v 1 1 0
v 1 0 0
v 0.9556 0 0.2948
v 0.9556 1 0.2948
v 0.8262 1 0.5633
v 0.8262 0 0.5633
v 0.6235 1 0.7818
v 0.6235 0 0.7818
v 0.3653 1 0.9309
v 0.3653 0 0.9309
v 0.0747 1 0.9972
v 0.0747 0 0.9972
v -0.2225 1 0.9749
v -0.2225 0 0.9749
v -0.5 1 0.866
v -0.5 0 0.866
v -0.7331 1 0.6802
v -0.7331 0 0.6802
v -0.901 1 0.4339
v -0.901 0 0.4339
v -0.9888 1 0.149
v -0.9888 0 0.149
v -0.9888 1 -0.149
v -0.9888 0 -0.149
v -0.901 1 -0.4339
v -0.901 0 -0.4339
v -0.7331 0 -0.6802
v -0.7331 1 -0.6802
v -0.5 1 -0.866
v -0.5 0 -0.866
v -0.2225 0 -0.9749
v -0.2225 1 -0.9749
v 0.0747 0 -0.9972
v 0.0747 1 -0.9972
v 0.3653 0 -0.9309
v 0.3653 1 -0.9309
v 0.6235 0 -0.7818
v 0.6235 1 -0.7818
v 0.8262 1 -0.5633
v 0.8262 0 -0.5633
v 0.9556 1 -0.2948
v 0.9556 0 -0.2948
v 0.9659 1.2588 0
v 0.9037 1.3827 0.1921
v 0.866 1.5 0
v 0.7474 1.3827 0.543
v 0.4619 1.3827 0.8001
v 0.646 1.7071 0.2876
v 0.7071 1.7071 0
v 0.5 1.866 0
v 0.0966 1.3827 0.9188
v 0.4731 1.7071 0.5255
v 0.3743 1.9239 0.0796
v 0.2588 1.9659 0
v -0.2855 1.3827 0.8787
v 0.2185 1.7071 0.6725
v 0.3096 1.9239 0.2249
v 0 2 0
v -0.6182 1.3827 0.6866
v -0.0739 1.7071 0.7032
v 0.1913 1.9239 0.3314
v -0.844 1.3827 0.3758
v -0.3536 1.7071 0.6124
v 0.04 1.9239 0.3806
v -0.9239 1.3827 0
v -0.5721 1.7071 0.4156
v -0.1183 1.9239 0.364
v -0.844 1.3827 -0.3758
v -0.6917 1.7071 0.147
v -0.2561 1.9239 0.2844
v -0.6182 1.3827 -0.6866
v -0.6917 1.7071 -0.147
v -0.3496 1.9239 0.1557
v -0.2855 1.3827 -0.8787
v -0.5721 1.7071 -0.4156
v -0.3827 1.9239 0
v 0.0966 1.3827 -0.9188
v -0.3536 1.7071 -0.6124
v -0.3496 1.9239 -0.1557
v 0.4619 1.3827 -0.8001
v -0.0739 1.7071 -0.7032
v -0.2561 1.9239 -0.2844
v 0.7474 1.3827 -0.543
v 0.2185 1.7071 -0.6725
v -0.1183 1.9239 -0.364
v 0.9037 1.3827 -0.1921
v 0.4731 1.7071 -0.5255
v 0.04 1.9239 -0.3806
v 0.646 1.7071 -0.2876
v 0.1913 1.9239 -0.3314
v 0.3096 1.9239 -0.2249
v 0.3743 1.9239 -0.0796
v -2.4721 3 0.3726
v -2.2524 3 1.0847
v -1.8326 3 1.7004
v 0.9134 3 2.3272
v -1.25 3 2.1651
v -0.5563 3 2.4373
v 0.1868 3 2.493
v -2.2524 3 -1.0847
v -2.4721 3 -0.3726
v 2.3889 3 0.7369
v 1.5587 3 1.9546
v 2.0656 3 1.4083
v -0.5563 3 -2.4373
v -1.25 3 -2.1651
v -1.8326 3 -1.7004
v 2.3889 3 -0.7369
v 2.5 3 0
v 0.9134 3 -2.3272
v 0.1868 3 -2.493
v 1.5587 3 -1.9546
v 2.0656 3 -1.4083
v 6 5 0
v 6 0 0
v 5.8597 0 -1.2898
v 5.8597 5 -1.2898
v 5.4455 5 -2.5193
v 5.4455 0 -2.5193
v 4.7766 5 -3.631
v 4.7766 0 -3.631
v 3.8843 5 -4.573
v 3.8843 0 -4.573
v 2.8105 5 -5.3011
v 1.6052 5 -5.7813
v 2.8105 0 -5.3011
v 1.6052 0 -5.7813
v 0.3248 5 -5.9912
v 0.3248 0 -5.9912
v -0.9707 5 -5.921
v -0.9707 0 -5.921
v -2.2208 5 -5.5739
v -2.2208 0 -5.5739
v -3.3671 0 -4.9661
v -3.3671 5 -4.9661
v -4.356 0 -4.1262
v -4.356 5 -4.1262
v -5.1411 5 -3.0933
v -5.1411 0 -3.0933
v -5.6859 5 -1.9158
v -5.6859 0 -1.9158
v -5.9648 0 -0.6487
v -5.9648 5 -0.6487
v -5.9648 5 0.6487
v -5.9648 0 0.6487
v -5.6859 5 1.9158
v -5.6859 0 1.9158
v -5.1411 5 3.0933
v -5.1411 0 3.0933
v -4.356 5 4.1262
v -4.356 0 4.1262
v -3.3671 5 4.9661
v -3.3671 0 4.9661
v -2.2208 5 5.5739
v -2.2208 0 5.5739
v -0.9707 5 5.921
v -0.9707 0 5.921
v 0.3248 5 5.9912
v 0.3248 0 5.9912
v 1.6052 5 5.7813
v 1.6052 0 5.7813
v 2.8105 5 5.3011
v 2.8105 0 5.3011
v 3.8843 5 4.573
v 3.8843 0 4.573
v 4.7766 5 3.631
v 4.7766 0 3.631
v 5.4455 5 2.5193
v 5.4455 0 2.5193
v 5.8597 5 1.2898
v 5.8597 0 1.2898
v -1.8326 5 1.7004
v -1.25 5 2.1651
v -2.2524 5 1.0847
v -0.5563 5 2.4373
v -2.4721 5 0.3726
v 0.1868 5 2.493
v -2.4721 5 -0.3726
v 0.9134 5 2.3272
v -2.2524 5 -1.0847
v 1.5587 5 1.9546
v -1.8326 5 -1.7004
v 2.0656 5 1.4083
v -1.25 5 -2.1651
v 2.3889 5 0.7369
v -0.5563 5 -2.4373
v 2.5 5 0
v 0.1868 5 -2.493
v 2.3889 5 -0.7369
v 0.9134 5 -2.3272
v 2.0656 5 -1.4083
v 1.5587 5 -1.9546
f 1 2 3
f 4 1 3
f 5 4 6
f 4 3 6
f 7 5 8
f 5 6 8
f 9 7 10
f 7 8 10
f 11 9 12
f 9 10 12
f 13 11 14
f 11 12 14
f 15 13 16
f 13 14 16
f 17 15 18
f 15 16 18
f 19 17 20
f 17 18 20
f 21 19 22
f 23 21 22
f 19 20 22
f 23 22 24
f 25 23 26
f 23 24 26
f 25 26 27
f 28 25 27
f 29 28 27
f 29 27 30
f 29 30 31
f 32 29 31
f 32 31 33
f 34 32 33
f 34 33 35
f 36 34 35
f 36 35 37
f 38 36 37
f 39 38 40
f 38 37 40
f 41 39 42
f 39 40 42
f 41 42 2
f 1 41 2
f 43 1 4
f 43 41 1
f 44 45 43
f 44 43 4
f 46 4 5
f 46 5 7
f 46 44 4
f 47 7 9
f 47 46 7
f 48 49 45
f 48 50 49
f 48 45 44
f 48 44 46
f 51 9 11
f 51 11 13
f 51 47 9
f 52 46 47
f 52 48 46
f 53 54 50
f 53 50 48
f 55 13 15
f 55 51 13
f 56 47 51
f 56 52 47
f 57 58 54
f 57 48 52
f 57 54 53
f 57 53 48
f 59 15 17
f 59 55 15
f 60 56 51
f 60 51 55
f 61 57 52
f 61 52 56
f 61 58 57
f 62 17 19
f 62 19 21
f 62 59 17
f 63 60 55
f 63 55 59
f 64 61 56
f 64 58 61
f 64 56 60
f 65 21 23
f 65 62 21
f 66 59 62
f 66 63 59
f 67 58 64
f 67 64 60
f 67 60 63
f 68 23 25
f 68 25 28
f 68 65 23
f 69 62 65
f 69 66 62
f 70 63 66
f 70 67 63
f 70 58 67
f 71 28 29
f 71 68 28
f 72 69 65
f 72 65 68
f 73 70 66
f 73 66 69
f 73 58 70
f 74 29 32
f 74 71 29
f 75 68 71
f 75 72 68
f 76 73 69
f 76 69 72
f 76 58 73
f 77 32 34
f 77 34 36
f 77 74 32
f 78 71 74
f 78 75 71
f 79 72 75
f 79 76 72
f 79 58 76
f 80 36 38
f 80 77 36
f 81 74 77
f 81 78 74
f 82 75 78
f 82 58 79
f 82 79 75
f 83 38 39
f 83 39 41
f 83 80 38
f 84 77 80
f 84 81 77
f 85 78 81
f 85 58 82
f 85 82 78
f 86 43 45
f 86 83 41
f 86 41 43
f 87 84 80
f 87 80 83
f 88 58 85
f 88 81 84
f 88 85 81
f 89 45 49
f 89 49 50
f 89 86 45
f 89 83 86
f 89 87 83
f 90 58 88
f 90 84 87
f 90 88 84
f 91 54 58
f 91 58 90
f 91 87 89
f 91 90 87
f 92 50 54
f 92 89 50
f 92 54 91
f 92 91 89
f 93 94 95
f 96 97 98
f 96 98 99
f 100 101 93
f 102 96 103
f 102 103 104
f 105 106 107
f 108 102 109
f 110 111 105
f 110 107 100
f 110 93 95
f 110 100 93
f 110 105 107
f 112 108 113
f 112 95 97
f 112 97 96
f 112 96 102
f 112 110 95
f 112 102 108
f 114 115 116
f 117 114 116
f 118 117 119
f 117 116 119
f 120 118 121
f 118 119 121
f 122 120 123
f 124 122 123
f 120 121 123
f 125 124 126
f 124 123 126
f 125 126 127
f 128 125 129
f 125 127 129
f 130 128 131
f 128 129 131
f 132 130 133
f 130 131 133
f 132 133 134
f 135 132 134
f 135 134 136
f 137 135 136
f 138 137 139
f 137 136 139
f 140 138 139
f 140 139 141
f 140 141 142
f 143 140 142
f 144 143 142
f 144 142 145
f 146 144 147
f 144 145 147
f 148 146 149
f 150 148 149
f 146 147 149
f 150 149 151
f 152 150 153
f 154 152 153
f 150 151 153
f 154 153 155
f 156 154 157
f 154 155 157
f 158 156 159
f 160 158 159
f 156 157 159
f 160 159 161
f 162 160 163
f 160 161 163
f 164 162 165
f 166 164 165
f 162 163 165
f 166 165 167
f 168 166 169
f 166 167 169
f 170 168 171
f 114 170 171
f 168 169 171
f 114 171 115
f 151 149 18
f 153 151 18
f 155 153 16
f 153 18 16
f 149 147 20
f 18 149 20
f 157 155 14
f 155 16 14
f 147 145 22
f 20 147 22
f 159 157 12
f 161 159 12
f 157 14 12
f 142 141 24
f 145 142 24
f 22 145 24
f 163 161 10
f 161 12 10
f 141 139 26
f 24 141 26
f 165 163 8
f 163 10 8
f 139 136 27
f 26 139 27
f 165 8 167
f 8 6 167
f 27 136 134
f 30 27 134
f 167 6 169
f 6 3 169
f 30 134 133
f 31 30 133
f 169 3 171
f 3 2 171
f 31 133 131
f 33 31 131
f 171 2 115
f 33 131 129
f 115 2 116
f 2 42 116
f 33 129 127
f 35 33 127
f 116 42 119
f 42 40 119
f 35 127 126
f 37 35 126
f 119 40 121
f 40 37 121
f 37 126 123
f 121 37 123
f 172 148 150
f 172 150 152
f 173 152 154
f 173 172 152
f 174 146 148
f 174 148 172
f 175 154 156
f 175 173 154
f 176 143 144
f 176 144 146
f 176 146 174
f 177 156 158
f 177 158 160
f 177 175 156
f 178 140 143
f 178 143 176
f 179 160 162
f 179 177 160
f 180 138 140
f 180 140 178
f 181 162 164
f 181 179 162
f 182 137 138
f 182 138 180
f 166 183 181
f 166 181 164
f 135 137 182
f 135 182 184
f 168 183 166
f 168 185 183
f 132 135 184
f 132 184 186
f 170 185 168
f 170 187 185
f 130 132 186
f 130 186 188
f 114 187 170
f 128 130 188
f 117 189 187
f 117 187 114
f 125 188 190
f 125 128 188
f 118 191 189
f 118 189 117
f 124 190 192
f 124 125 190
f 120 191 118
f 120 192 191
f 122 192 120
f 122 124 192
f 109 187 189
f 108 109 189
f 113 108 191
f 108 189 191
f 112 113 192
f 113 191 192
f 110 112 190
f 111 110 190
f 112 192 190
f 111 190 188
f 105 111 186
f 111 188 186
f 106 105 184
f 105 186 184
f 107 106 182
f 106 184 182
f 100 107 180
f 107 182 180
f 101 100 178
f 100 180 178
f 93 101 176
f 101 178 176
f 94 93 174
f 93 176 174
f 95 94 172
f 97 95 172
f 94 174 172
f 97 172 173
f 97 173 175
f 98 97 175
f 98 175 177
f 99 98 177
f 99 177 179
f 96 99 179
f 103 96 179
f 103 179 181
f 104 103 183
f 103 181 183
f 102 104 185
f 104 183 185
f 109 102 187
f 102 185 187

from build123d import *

# Parameters (mm, degrees)
SKETCH1_R           = 6
BOSS_EXTRUDE1_DEPTH = 5
SKETCH2_R           = 2.5
CUT_EXTRUDE1_DEPTH  = 2
SKETCH3_R           = 1
CUT_EXTRUDE2_DEPTH  = 2
FILLET1_R           = 1


with BuildPart() as part:
    # Sketch1 → Boss-Extrude1 (new body)
    with BuildSketch(Plane(origin=(0, 0, 0), x_dir=(1, 0, 0), z_dir=(0, 1, 0))):
        Circle(SKETCH1_R)
    extrude(amount=BOSS_EXTRUDE1_DEPTH)

    # Sketch2 → Cut-Extrude1 (cut)
    with BuildSketch(Plane(origin=(0, 5, 0), x_dir=(1, 0, 0), z_dir=(0, 1, 0))):
        Circle(SKETCH2_R)
    extrude(amount=-CUT_EXTRUDE1_DEPTH, mode=Mode.SUBTRACT)

    # Sketch3 → Cut-Extrude2 (cut)
    with BuildSketch(Plane.XZ):
        Circle(SKETCH3_R)
    extrude(amount=-CUT_EXTRUDE2_DEPTH, mode=Mode.SUBTRACT)

    # Fillet1
    fillet1_edges = [part.edges().sort_by_distance(p)[0] for p in [
        (-1, 2, 0),
    ]]
    fillet(fillet1_edges, radius=FILLET1_R)


solid = part.part
